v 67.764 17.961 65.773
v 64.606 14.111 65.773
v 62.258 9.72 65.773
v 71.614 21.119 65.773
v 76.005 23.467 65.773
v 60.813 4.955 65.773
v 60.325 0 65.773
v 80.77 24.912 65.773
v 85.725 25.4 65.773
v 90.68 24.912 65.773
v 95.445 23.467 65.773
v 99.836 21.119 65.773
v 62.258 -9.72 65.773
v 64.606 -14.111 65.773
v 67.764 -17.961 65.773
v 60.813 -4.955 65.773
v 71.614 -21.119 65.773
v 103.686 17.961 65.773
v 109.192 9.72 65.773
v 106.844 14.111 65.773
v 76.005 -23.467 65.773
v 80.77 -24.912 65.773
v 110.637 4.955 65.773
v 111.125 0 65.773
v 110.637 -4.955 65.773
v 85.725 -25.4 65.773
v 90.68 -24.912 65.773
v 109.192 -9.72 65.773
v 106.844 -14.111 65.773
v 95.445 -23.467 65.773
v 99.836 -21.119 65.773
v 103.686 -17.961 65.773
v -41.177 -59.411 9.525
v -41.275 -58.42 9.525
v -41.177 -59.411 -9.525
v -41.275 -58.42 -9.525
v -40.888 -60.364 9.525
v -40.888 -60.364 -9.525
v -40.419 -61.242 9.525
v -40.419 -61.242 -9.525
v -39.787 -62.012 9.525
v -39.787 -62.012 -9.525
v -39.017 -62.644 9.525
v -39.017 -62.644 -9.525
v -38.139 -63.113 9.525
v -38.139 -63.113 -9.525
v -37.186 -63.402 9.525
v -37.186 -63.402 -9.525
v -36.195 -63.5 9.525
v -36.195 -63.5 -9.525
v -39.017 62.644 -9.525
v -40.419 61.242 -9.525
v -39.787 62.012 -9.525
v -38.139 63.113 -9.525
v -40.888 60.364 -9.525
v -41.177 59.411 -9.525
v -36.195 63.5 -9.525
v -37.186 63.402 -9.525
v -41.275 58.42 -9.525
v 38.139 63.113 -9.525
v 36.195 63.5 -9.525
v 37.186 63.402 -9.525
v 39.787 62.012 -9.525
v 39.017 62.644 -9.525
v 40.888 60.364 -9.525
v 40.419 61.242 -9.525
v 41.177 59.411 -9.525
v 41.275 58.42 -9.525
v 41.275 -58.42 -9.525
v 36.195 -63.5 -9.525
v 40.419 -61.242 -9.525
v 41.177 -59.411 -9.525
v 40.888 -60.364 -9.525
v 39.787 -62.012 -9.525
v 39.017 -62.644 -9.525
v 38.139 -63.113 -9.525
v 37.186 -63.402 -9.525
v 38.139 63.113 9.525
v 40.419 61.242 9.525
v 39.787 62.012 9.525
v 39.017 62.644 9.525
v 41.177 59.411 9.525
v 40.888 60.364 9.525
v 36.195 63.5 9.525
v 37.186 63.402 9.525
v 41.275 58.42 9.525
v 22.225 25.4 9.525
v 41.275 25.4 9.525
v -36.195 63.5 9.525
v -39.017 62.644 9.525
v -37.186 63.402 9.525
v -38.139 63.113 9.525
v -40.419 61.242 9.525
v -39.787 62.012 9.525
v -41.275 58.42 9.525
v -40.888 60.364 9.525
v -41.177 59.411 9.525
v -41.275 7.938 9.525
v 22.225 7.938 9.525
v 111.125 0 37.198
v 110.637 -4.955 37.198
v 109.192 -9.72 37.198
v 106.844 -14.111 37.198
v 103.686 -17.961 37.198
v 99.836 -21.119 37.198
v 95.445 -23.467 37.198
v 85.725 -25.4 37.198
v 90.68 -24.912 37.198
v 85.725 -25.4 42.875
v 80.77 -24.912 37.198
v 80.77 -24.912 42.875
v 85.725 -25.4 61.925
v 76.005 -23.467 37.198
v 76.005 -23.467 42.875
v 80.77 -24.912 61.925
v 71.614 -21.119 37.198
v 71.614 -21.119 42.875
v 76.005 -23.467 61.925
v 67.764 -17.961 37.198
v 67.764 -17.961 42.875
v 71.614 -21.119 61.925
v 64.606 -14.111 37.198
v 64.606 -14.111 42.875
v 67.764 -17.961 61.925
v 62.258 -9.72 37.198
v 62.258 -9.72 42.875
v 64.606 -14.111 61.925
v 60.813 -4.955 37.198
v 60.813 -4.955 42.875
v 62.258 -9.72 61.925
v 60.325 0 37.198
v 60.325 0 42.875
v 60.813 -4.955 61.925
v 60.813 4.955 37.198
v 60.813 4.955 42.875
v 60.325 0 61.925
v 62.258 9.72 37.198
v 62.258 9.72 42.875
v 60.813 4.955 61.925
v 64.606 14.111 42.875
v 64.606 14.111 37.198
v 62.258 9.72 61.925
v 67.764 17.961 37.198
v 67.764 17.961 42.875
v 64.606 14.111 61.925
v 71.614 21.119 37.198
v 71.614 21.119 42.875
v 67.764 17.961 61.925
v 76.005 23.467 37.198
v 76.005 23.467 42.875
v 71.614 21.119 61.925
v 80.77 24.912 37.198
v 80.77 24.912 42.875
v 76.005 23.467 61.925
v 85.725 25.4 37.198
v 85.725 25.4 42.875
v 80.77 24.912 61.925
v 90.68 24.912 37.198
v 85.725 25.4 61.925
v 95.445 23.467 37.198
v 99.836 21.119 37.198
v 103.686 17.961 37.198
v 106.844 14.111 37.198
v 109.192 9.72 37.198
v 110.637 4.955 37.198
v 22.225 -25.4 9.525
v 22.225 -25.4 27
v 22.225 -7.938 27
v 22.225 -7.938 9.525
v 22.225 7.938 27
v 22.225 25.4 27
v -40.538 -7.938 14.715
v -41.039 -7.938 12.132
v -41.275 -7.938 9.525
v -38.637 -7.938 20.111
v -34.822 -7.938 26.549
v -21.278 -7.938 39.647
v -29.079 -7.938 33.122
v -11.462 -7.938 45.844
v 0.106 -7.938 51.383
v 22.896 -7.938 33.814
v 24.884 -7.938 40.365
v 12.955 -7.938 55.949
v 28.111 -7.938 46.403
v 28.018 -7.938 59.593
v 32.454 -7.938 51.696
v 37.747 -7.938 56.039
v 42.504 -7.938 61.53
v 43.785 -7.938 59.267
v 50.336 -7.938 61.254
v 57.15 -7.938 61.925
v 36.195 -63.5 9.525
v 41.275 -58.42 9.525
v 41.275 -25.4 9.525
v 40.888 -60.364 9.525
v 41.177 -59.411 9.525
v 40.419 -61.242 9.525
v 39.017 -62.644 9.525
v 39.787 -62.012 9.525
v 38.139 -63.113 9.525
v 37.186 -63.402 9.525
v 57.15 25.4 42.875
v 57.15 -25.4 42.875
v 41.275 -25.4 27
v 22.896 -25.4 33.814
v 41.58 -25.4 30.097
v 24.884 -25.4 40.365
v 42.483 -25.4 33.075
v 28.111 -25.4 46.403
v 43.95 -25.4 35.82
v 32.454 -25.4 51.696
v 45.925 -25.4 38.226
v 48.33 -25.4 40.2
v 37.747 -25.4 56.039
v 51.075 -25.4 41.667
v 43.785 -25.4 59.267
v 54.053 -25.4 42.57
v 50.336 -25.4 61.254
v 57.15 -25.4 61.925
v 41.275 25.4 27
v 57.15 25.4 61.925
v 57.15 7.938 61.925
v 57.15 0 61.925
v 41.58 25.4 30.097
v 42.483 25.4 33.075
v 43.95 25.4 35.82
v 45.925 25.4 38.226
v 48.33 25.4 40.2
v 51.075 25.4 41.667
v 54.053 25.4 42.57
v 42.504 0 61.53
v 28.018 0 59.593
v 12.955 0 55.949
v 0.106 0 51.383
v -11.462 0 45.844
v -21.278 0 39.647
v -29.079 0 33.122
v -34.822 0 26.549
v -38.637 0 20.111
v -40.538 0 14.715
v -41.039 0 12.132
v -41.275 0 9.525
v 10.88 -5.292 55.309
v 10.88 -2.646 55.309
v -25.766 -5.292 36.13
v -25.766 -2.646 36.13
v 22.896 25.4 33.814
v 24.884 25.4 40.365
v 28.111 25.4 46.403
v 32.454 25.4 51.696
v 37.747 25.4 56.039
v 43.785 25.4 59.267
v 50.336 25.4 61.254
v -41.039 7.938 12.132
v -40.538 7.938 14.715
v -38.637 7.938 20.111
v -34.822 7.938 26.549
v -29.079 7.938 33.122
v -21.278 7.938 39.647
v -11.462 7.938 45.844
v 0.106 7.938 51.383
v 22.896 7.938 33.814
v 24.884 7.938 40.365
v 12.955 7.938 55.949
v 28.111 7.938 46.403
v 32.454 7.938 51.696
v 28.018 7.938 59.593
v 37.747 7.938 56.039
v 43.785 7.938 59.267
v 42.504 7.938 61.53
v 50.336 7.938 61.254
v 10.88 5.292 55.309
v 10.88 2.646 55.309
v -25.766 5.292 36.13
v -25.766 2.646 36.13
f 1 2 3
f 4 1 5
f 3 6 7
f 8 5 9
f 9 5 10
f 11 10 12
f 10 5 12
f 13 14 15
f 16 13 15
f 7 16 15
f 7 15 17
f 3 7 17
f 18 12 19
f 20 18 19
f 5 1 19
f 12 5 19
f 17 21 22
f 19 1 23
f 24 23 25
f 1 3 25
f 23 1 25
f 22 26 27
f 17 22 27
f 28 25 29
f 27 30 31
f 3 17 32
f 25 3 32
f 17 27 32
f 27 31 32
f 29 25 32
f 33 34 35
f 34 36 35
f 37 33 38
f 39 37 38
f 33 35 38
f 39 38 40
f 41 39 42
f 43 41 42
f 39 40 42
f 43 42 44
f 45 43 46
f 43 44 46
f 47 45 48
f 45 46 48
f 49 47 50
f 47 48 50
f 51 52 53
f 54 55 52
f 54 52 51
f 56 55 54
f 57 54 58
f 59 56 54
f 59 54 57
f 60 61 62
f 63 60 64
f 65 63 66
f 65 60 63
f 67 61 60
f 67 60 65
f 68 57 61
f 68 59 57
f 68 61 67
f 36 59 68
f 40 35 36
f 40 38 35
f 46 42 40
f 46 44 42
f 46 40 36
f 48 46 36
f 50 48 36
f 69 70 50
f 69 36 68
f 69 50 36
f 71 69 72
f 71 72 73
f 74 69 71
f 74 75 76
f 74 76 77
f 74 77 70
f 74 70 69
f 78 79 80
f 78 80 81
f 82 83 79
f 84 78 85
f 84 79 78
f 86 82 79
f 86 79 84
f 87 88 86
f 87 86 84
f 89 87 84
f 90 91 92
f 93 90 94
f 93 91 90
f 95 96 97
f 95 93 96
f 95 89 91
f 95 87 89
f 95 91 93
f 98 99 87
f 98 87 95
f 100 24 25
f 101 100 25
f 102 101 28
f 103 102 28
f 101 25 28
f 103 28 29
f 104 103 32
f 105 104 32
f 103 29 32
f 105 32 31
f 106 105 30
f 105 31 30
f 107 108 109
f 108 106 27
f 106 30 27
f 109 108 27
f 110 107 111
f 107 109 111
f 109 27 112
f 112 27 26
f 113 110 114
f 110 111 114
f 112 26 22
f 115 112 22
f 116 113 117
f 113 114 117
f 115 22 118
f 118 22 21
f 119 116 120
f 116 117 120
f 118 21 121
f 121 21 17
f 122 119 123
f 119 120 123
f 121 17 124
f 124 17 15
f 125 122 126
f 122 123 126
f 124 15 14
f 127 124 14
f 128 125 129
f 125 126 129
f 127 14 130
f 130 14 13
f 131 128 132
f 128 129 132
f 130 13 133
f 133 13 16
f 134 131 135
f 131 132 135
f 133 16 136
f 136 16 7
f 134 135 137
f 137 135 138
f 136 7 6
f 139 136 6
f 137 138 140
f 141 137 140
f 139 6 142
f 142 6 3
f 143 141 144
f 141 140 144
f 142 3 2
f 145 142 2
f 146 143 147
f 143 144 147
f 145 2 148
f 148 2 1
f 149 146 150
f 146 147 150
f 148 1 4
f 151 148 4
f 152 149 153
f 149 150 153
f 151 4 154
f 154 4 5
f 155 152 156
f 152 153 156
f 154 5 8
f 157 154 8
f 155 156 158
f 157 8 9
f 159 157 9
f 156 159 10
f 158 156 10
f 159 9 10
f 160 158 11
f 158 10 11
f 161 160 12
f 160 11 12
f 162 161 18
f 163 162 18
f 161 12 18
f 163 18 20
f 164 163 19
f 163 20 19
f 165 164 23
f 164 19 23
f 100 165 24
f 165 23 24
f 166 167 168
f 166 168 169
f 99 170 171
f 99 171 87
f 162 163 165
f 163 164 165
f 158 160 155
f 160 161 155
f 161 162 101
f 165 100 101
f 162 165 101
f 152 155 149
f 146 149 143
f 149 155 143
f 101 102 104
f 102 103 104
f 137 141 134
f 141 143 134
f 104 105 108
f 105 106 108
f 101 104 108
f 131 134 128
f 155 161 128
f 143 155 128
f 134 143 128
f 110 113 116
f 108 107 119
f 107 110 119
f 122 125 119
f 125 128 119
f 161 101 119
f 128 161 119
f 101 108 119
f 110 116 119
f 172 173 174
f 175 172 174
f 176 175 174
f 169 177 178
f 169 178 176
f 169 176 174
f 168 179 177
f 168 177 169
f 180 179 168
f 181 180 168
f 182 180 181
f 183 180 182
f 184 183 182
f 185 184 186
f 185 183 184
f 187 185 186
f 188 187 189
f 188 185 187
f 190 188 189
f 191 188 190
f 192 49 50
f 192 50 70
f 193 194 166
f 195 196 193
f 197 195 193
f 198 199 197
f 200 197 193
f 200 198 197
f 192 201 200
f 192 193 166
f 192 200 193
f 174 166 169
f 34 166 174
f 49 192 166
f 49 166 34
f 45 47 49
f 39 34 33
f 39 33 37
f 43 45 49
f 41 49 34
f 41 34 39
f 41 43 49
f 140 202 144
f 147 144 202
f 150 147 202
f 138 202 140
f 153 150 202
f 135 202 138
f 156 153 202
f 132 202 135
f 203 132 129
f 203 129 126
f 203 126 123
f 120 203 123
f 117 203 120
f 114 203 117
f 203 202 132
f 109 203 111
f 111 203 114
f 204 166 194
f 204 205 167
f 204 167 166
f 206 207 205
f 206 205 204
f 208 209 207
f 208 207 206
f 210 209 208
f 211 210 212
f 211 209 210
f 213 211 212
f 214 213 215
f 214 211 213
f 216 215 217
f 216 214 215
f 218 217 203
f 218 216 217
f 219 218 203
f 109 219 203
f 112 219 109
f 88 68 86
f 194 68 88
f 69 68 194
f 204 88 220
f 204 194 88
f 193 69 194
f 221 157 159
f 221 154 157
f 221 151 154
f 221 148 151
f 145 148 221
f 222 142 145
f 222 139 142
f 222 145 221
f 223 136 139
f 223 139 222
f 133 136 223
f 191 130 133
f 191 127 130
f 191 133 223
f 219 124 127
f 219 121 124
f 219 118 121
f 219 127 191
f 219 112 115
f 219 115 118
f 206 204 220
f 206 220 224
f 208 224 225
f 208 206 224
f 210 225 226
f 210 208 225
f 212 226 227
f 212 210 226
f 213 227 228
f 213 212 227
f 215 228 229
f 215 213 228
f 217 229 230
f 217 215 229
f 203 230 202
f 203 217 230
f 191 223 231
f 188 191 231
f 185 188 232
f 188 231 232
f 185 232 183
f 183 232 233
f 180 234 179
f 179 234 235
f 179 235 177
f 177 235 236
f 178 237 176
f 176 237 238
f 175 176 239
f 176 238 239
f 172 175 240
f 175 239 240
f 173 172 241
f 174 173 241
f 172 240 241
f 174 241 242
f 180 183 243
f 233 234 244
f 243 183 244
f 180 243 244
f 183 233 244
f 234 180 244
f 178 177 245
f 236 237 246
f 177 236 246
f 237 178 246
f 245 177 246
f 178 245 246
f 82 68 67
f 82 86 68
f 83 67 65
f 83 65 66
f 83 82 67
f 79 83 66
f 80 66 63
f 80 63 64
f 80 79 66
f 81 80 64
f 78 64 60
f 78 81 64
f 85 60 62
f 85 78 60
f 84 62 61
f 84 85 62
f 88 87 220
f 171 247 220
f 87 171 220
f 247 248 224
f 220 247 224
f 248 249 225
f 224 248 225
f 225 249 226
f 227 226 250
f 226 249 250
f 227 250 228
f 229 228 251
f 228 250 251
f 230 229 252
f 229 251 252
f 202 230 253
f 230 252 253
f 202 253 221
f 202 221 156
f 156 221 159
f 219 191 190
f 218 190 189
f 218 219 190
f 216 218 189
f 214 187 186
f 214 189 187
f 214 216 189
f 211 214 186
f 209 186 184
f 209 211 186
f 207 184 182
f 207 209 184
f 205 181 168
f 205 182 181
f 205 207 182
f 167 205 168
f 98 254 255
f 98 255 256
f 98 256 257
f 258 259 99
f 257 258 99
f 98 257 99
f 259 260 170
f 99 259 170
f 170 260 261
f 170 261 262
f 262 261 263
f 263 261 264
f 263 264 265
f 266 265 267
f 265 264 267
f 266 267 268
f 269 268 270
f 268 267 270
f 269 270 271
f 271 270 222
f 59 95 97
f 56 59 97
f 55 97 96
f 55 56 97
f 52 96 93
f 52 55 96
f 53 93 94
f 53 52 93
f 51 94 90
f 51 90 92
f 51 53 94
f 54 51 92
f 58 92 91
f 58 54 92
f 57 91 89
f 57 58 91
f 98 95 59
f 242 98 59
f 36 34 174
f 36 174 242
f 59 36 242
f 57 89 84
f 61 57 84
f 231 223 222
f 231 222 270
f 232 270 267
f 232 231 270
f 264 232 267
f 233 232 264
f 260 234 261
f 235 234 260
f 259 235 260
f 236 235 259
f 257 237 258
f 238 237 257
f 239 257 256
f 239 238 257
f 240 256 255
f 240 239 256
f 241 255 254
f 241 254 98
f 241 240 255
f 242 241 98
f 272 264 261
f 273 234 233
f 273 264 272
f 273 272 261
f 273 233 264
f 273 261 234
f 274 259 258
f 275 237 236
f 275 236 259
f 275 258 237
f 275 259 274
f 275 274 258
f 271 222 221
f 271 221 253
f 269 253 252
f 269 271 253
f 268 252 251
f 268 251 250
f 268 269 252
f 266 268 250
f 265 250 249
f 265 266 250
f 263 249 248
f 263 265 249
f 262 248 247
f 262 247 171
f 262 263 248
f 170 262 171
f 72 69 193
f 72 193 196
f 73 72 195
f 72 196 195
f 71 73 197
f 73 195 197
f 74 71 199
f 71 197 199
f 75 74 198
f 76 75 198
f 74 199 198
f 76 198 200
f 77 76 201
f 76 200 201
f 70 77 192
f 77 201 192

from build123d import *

# Parameters (mm, degrees)
F1_DEPTH = 63.5
F2_DEPTH = 25.4
F4_DEPTH = 7.9375
F5_R     = 5.08


with BuildPart() as f1:
    # F0 (on Front) → F1 (new body, symmetric)
    with BuildSketch(Plane.XZ):
        Polygon((41.275, -9.525), (41.275, 9.525), (22.225, 9.525), (-41.275, 9.525), (-41.275, -9.525), align=None)
    extrude(amount=F1_DEPTH, both=True)

    # F0 (on Front) → F2 (join, symmetric)
    with BuildSketch(Plane.XZ):
        with BuildLine():
            Line((22.225, 9.525), (41.275, 9.525))
            Line((41.275, 9.525), (41.275, 27.0002))
            ThreePointArc((41.275, 27.0002), (45.92468, 38.22552), (57.15, 42.8752))
            Line((57.15, 42.8752), (60.325, 42.8752))
            Line((60.325, 42.8752), (60.325, 61.9252))
            Line((60.325, 61.9252), (57.15, 61.9252))
            ThreePointArc((57.15, 61.9252), (32.454296, 51.695904), (22.225, 27.0002))
            Line((22.225, 27.0002), (22.225, 9.525))
        make_face()
        Polygon((60.325, 61.9252), (60.325, 42.8752), (85.725, 42.8752), (85.725, 51.485013), (85.725, 61.9252), align=None)
    extrude(amount=F2_DEPTH, both=True)

    # F0 (on Front) → F3 (revolve)
    with BuildSketch(Plane.XZ):
        Polygon((85.725, 51.485013), (85.725, 42.8752), (85.725, 37.197513), (111.125, 37.197513), (111.125, 65.772513), (85.725, 65.772513), (85.725, 61.9252), align=None)
    revolve(axis=Axis((85.725, 0, 56.705107), (0, 0, -1)))

    # F0 (on Front) → F4 (join, symmetric)
    with BuildSketch(Plane.XZ):
        with BuildLine():
            Line((-41.275, 9.525), (22.225, 9.525))
            Line((22.225, 9.525), (22.225, 27.0002))
            ThreePointArc((22.225, 27.0002), (32.454296, 51.695904), (57.15, 61.9252))
            add(Edge.make_bspline(
                [(57.15, 61.9252), (9.904783, 63.30175), (-40.170714, 38.131271), (-41.275, 9.525)],
                knots=[0, 0, 0, 0, 111.504536, 111.504536, 111.504536, 111.504536], degree=3))
        make_face()
    extrude(amount=F4_DEPTH, both=True)

    # F5
    f5_edges = [f1.edges().sort_by_distance(p)[0] for p in [
        (41.275, 63.5, 0),
        (-41.275, 63.5, 0),
        (-41.275, -63.5, 0),
        (41.275, -63.5, 0),
    ]]
    fillet(f5_edges, radius=F5_R)


solid = f1.part
